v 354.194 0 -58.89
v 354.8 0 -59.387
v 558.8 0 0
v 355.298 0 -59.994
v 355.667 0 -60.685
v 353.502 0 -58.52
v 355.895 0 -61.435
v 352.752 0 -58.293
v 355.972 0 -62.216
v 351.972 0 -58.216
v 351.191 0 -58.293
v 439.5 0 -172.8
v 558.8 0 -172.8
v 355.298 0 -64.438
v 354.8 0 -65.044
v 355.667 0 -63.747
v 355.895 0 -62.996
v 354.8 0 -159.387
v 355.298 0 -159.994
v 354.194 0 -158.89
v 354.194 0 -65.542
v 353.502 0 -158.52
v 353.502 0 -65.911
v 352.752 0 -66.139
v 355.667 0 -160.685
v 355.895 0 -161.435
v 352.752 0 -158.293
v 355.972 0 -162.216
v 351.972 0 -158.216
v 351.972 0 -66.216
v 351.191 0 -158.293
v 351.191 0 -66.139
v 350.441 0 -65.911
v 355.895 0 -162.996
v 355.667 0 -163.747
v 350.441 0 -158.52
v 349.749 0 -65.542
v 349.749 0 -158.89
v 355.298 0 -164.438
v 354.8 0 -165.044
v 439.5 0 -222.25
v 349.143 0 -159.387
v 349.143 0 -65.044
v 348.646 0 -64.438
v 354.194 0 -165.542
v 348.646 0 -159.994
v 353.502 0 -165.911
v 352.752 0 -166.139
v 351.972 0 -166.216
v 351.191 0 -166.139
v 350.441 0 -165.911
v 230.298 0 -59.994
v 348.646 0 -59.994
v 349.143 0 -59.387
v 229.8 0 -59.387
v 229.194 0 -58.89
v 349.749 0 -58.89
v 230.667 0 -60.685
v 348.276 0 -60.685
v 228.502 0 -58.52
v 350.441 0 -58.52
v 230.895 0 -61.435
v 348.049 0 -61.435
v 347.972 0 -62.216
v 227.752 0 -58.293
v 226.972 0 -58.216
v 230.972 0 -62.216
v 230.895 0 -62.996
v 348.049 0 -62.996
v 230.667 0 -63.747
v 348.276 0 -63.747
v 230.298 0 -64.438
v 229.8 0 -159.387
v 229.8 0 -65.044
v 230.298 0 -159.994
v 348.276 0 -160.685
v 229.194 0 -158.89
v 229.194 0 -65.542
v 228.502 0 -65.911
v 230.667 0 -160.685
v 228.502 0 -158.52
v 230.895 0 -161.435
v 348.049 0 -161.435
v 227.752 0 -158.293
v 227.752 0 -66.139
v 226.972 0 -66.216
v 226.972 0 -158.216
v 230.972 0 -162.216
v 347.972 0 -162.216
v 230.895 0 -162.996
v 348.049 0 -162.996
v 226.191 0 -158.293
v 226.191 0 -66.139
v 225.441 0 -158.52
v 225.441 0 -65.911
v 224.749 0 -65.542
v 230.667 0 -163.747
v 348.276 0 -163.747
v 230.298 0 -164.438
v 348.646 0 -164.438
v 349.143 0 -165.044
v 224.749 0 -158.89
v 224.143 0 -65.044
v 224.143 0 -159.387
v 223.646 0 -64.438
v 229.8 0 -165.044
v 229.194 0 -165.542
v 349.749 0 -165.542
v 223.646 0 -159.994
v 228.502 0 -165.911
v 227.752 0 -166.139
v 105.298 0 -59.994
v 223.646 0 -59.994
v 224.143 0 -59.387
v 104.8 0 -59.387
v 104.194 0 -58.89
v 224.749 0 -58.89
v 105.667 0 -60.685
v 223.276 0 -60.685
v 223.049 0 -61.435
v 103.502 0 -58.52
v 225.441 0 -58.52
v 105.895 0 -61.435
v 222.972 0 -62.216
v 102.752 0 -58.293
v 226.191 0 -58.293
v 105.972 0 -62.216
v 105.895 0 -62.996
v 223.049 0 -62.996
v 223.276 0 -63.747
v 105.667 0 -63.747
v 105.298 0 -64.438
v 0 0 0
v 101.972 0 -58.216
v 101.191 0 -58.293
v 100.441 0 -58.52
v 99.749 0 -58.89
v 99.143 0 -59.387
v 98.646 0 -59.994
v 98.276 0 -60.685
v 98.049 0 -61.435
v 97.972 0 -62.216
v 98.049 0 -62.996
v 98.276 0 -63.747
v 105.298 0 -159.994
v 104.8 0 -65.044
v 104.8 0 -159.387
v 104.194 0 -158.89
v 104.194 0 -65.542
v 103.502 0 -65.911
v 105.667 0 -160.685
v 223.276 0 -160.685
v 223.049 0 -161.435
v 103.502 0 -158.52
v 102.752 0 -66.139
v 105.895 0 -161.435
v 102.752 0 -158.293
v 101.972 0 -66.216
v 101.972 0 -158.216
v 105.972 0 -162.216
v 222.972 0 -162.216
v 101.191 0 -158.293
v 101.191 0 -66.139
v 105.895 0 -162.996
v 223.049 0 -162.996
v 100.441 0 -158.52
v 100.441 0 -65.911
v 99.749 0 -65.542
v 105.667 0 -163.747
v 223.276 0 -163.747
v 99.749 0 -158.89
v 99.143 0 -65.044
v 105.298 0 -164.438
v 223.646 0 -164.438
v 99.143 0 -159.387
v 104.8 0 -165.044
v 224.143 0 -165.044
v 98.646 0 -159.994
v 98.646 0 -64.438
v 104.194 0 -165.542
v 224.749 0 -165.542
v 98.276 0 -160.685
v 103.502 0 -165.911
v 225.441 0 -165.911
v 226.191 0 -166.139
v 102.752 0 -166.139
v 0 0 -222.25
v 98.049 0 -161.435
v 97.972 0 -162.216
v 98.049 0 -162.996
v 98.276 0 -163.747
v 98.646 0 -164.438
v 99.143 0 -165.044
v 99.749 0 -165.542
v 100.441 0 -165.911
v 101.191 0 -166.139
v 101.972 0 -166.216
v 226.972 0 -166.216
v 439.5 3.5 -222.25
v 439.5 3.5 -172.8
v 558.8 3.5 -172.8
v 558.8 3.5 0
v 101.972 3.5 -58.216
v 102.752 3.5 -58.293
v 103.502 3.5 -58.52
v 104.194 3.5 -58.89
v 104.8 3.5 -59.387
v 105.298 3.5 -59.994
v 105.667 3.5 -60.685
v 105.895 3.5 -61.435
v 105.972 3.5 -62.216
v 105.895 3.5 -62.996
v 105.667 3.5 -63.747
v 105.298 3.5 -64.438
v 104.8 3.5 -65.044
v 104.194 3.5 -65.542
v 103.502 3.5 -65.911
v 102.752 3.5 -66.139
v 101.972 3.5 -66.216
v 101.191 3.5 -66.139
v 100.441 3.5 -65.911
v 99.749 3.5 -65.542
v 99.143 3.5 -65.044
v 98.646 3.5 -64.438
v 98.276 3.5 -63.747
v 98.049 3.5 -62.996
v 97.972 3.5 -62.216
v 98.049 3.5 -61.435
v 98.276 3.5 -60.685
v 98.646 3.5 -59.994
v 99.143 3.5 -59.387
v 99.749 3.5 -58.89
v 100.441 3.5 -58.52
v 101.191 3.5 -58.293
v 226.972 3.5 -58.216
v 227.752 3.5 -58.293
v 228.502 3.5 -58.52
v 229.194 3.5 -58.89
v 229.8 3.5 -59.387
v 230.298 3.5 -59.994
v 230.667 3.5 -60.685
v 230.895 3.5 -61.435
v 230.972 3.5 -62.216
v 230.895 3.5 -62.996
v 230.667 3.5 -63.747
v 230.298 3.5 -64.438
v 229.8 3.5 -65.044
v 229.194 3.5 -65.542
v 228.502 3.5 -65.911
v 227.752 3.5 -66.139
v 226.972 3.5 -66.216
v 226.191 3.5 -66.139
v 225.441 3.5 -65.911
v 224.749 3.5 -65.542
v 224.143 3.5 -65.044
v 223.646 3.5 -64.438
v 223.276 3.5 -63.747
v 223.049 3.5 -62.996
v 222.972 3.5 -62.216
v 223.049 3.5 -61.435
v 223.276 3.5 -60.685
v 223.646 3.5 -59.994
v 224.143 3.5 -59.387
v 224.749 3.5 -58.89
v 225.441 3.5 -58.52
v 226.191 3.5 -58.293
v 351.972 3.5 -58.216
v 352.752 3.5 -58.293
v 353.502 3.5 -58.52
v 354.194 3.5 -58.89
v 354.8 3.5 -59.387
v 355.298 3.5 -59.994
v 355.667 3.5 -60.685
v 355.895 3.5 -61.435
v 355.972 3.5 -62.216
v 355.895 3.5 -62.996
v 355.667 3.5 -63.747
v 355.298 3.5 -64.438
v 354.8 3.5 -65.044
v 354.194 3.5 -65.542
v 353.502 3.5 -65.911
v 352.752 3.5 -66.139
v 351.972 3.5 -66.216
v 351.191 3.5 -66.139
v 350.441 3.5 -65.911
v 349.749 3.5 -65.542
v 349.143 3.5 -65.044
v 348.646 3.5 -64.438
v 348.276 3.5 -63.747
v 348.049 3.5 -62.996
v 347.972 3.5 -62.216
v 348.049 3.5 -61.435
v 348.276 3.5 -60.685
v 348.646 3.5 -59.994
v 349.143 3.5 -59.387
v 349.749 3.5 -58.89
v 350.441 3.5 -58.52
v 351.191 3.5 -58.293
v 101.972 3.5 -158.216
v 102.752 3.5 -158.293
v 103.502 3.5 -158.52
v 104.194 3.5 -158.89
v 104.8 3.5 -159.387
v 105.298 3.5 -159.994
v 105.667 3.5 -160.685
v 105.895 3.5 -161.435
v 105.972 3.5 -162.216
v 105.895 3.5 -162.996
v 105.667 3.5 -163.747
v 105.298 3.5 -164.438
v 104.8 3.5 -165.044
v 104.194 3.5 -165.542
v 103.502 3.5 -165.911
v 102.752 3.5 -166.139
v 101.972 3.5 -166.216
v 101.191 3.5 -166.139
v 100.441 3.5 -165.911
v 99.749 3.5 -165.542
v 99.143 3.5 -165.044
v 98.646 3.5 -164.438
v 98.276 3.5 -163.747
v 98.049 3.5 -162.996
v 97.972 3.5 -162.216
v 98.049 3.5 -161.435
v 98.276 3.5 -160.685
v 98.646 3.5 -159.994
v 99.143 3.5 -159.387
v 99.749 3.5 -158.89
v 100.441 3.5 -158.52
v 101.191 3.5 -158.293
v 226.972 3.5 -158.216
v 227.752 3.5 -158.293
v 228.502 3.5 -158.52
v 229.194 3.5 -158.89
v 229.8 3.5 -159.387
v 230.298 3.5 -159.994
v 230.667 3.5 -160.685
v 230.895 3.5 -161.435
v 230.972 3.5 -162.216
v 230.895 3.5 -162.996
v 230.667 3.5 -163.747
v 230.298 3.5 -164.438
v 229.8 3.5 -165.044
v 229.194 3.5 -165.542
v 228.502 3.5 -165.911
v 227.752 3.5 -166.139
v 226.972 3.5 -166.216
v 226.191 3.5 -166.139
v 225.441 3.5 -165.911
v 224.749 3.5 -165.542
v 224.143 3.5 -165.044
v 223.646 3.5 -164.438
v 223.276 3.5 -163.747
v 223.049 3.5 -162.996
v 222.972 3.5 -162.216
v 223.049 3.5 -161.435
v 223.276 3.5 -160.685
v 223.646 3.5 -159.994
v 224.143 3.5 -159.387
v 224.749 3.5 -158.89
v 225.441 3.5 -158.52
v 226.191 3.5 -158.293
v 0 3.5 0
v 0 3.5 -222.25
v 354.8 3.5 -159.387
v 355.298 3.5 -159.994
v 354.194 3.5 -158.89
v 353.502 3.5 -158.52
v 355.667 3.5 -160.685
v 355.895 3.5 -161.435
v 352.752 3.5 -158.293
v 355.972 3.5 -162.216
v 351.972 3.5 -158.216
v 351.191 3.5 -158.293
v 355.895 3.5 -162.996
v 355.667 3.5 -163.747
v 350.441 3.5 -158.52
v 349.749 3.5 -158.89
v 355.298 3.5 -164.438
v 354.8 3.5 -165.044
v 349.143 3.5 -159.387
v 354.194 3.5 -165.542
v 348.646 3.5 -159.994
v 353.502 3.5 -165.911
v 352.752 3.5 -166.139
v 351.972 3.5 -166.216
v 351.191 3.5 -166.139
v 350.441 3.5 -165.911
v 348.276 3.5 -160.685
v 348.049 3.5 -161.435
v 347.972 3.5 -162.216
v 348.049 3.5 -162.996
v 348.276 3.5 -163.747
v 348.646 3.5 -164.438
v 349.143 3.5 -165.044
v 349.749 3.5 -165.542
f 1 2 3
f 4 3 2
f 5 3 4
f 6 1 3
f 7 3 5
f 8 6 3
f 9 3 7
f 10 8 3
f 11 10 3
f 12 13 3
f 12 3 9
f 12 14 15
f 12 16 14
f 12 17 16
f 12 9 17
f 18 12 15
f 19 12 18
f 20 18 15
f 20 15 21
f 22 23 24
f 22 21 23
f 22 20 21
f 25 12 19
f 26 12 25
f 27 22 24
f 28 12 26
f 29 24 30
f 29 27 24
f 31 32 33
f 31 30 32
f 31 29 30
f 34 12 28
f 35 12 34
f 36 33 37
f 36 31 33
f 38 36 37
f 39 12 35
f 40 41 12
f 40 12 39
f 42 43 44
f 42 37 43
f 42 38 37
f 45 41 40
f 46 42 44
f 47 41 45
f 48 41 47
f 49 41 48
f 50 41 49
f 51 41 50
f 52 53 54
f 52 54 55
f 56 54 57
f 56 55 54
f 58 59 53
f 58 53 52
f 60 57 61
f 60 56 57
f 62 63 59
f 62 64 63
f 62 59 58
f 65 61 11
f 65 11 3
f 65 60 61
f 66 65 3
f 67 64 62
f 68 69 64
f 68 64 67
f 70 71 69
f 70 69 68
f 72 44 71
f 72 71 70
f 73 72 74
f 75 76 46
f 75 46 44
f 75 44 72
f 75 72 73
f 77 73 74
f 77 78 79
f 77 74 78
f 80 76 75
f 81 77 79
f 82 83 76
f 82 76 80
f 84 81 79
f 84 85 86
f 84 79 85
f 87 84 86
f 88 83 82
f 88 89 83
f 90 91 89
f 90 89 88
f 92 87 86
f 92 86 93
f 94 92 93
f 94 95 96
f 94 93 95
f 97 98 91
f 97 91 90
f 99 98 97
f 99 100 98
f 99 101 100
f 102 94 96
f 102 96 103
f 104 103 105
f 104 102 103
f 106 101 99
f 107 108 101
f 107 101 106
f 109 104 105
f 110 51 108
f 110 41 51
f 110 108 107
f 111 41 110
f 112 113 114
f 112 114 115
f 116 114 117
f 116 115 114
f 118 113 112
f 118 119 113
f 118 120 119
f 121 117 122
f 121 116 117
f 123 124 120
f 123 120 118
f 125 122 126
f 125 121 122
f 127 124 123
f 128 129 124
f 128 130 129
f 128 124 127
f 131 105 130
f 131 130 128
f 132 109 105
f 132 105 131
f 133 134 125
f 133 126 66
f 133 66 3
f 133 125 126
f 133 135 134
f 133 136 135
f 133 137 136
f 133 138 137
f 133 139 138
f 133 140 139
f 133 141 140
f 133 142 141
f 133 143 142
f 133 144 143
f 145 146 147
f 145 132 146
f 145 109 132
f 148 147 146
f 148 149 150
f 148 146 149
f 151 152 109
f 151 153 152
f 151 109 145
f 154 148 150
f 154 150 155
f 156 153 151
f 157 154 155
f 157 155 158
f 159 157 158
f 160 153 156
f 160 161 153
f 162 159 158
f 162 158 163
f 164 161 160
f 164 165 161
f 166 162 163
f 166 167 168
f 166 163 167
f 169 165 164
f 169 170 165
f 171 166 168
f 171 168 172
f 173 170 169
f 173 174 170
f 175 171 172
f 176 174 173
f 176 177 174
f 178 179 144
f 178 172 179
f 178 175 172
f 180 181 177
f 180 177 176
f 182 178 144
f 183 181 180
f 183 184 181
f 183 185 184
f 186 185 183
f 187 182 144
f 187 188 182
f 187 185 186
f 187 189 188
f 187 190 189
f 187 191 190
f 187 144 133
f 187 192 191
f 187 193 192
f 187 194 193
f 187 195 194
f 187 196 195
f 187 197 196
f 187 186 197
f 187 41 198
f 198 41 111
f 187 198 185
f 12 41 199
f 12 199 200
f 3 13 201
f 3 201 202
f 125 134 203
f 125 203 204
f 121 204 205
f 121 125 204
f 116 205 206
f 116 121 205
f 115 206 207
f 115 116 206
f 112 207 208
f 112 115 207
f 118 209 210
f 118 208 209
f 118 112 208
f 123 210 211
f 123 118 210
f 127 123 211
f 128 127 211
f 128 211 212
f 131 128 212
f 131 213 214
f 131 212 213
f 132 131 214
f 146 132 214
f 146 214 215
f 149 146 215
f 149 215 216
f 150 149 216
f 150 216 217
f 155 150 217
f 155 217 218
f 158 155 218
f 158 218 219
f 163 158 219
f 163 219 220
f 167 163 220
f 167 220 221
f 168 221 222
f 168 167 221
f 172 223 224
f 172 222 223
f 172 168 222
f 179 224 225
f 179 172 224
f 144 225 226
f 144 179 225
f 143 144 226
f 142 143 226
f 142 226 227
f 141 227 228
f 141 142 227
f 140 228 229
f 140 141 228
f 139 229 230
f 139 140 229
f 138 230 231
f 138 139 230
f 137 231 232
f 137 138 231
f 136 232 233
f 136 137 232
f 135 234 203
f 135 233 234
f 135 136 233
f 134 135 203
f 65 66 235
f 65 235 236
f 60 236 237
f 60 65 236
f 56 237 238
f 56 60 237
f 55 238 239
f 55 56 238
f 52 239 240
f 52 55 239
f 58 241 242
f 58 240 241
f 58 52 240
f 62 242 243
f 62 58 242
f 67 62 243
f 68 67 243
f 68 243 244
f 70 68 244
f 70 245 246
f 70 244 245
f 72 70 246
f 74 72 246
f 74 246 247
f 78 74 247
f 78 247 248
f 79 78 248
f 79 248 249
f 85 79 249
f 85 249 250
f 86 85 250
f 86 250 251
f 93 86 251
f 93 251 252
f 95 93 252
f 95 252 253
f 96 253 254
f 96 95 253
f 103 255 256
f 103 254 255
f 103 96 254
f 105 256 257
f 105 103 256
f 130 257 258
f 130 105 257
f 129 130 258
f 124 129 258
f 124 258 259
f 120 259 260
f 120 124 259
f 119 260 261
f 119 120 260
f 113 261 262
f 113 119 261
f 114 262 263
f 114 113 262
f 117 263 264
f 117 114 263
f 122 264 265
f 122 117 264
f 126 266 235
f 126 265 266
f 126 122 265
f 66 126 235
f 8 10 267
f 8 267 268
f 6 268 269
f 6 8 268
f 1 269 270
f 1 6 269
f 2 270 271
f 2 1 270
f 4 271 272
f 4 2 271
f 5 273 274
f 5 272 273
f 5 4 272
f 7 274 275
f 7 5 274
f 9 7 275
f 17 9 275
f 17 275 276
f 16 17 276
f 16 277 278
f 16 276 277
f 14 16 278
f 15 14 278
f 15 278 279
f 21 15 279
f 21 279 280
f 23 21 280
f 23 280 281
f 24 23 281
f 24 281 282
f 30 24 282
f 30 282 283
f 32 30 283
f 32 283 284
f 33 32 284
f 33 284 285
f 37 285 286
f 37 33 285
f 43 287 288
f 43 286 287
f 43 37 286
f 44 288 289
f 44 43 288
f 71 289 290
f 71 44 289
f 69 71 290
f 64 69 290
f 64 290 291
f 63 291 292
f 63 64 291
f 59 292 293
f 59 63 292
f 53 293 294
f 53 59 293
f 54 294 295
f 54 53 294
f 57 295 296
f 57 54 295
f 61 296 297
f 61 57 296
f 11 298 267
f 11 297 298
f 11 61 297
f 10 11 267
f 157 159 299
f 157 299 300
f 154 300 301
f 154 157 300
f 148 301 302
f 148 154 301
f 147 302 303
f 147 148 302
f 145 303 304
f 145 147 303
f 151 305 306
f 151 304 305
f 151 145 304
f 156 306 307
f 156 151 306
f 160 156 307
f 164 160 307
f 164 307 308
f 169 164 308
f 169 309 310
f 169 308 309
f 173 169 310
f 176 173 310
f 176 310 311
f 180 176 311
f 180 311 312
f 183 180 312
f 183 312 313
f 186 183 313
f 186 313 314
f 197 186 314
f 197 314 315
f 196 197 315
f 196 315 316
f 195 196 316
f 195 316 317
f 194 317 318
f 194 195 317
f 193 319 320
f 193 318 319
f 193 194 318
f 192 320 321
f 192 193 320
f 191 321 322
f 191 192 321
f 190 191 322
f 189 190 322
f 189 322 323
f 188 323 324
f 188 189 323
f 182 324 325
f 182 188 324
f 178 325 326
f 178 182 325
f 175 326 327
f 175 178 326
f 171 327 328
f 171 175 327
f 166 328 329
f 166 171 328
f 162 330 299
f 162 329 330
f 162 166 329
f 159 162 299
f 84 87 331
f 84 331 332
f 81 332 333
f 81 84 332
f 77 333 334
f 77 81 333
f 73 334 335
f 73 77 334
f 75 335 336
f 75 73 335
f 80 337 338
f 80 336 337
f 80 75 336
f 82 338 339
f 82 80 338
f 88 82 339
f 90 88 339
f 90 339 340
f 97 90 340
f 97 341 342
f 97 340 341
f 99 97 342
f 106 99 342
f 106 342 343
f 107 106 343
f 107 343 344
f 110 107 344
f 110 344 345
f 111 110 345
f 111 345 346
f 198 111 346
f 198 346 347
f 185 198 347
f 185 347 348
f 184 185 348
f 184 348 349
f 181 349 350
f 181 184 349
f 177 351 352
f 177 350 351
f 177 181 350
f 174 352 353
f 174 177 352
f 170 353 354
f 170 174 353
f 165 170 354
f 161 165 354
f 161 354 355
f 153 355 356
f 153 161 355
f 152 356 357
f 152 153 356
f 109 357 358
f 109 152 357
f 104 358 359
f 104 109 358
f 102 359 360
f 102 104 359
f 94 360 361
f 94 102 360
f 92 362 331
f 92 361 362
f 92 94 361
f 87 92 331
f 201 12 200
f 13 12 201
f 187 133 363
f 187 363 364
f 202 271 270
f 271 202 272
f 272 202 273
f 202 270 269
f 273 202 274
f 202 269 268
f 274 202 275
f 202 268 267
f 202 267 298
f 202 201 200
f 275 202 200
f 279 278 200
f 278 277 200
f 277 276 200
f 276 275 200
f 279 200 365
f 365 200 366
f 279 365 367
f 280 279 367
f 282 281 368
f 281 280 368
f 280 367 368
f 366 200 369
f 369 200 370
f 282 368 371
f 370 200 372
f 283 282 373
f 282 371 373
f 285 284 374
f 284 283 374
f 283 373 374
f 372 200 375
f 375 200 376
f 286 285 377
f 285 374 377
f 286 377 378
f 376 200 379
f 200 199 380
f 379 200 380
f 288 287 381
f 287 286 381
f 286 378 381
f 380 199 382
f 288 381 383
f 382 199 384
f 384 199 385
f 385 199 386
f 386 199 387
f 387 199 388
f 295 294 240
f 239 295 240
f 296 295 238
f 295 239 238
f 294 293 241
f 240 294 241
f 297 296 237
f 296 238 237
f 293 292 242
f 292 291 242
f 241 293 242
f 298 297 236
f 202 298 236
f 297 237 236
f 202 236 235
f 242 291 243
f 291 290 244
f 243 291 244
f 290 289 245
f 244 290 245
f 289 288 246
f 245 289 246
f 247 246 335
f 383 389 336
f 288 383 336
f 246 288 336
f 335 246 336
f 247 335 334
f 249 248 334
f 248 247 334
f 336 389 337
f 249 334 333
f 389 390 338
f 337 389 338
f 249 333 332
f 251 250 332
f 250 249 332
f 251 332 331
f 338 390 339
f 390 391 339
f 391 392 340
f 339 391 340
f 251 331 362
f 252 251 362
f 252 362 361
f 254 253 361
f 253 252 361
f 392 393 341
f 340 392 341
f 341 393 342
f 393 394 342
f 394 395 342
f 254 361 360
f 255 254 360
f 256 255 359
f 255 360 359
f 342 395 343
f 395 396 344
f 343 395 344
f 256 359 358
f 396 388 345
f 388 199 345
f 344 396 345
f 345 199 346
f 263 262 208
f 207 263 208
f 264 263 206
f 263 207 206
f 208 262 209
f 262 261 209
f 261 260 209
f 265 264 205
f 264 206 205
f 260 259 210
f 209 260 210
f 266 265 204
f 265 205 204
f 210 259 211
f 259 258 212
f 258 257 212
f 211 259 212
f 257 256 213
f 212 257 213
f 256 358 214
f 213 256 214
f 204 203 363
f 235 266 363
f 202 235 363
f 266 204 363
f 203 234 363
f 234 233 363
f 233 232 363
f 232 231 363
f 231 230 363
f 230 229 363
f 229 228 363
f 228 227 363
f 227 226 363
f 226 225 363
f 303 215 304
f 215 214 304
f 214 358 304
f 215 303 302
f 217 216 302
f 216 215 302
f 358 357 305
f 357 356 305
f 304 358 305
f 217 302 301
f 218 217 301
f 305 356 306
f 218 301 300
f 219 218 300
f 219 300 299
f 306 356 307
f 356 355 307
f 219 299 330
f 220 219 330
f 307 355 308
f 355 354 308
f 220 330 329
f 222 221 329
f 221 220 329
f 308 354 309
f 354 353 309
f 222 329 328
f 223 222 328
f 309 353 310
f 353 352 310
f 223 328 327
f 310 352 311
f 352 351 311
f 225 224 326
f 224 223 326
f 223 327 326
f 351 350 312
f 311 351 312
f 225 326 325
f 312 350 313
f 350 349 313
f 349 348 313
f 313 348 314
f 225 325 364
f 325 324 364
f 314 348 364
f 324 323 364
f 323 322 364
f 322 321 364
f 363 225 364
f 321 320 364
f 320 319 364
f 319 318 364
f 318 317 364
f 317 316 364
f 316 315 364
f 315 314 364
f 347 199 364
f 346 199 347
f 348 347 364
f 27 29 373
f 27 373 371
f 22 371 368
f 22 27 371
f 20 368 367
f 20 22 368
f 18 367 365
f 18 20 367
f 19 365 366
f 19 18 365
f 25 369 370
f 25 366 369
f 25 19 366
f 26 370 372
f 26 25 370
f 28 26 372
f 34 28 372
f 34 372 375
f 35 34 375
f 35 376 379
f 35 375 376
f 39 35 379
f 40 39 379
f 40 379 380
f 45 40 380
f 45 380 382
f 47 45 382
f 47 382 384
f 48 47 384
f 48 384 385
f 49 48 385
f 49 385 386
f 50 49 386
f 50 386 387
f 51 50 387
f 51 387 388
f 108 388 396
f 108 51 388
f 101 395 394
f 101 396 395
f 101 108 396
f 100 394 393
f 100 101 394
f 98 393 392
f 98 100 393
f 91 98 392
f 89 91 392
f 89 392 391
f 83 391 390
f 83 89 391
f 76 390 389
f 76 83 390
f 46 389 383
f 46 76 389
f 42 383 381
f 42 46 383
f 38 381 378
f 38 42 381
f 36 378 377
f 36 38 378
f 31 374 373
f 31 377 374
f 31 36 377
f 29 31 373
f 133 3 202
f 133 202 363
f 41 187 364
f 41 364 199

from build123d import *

# Parameters (mm, degrees)
BOSS_EXTRUDE1_DEPTH     = 3.5
CUT_EXTRUDE1_DEPTH      = 602.385693628
CUT_EXTRUDE1_DEPTH_BACK = 602.385693628
SKETCH2_R               = 4


with BuildPart() as part:
    # Sketch1 → Boss-Extrude1 (new body)
    with BuildSketch(Plane(origin=(0, 0, 0), x_dir=(1, 0, 0), z_dir=(0, 1, 0))):
        Polygon((0, 0), (0, 222.25), (439.5, 222.25), (439.5, 172.8), (558.8, 172.8), (558.8, 0), align=None)
    extrude(amount=BOSS_EXTRUDE1_DEPTH)

    # Sketch2 → Cut-Extrude1 (cut, two sides: drawn at the far end of the back side and taken through both)
    with BuildSketch(Plane(origin=(0, 3.5, 0), x_dir=(1, 0, 0), z_dir=(0, 1, 0)).offset(-CUT_EXTRUDE1_DEPTH_BACK)):
        with Locations((101.97168799, 162.2158083)):
            Circle(SKETCH2_R)
        with Locations((226.97168799, 162.2158083)):
            Circle(SKETCH2_R)
        with Locations((351.97168799, 162.2158083)):
            Circle(SKETCH2_R)
        with Locations((351.97168799, 62.2158083)):
            Circle(SKETCH2_R)
        with Locations((226.97168799, 62.2158083)):
            Circle(SKETCH2_R)
        with Locations((101.97168799, 62.2158083)):
            Circle(SKETCH2_R)
    extrude(amount=CUT_EXTRUDE1_DEPTH + CUT_EXTRUDE1_DEPTH_BACK, mode=Mode.SUBTRACT)


solid = part.part
